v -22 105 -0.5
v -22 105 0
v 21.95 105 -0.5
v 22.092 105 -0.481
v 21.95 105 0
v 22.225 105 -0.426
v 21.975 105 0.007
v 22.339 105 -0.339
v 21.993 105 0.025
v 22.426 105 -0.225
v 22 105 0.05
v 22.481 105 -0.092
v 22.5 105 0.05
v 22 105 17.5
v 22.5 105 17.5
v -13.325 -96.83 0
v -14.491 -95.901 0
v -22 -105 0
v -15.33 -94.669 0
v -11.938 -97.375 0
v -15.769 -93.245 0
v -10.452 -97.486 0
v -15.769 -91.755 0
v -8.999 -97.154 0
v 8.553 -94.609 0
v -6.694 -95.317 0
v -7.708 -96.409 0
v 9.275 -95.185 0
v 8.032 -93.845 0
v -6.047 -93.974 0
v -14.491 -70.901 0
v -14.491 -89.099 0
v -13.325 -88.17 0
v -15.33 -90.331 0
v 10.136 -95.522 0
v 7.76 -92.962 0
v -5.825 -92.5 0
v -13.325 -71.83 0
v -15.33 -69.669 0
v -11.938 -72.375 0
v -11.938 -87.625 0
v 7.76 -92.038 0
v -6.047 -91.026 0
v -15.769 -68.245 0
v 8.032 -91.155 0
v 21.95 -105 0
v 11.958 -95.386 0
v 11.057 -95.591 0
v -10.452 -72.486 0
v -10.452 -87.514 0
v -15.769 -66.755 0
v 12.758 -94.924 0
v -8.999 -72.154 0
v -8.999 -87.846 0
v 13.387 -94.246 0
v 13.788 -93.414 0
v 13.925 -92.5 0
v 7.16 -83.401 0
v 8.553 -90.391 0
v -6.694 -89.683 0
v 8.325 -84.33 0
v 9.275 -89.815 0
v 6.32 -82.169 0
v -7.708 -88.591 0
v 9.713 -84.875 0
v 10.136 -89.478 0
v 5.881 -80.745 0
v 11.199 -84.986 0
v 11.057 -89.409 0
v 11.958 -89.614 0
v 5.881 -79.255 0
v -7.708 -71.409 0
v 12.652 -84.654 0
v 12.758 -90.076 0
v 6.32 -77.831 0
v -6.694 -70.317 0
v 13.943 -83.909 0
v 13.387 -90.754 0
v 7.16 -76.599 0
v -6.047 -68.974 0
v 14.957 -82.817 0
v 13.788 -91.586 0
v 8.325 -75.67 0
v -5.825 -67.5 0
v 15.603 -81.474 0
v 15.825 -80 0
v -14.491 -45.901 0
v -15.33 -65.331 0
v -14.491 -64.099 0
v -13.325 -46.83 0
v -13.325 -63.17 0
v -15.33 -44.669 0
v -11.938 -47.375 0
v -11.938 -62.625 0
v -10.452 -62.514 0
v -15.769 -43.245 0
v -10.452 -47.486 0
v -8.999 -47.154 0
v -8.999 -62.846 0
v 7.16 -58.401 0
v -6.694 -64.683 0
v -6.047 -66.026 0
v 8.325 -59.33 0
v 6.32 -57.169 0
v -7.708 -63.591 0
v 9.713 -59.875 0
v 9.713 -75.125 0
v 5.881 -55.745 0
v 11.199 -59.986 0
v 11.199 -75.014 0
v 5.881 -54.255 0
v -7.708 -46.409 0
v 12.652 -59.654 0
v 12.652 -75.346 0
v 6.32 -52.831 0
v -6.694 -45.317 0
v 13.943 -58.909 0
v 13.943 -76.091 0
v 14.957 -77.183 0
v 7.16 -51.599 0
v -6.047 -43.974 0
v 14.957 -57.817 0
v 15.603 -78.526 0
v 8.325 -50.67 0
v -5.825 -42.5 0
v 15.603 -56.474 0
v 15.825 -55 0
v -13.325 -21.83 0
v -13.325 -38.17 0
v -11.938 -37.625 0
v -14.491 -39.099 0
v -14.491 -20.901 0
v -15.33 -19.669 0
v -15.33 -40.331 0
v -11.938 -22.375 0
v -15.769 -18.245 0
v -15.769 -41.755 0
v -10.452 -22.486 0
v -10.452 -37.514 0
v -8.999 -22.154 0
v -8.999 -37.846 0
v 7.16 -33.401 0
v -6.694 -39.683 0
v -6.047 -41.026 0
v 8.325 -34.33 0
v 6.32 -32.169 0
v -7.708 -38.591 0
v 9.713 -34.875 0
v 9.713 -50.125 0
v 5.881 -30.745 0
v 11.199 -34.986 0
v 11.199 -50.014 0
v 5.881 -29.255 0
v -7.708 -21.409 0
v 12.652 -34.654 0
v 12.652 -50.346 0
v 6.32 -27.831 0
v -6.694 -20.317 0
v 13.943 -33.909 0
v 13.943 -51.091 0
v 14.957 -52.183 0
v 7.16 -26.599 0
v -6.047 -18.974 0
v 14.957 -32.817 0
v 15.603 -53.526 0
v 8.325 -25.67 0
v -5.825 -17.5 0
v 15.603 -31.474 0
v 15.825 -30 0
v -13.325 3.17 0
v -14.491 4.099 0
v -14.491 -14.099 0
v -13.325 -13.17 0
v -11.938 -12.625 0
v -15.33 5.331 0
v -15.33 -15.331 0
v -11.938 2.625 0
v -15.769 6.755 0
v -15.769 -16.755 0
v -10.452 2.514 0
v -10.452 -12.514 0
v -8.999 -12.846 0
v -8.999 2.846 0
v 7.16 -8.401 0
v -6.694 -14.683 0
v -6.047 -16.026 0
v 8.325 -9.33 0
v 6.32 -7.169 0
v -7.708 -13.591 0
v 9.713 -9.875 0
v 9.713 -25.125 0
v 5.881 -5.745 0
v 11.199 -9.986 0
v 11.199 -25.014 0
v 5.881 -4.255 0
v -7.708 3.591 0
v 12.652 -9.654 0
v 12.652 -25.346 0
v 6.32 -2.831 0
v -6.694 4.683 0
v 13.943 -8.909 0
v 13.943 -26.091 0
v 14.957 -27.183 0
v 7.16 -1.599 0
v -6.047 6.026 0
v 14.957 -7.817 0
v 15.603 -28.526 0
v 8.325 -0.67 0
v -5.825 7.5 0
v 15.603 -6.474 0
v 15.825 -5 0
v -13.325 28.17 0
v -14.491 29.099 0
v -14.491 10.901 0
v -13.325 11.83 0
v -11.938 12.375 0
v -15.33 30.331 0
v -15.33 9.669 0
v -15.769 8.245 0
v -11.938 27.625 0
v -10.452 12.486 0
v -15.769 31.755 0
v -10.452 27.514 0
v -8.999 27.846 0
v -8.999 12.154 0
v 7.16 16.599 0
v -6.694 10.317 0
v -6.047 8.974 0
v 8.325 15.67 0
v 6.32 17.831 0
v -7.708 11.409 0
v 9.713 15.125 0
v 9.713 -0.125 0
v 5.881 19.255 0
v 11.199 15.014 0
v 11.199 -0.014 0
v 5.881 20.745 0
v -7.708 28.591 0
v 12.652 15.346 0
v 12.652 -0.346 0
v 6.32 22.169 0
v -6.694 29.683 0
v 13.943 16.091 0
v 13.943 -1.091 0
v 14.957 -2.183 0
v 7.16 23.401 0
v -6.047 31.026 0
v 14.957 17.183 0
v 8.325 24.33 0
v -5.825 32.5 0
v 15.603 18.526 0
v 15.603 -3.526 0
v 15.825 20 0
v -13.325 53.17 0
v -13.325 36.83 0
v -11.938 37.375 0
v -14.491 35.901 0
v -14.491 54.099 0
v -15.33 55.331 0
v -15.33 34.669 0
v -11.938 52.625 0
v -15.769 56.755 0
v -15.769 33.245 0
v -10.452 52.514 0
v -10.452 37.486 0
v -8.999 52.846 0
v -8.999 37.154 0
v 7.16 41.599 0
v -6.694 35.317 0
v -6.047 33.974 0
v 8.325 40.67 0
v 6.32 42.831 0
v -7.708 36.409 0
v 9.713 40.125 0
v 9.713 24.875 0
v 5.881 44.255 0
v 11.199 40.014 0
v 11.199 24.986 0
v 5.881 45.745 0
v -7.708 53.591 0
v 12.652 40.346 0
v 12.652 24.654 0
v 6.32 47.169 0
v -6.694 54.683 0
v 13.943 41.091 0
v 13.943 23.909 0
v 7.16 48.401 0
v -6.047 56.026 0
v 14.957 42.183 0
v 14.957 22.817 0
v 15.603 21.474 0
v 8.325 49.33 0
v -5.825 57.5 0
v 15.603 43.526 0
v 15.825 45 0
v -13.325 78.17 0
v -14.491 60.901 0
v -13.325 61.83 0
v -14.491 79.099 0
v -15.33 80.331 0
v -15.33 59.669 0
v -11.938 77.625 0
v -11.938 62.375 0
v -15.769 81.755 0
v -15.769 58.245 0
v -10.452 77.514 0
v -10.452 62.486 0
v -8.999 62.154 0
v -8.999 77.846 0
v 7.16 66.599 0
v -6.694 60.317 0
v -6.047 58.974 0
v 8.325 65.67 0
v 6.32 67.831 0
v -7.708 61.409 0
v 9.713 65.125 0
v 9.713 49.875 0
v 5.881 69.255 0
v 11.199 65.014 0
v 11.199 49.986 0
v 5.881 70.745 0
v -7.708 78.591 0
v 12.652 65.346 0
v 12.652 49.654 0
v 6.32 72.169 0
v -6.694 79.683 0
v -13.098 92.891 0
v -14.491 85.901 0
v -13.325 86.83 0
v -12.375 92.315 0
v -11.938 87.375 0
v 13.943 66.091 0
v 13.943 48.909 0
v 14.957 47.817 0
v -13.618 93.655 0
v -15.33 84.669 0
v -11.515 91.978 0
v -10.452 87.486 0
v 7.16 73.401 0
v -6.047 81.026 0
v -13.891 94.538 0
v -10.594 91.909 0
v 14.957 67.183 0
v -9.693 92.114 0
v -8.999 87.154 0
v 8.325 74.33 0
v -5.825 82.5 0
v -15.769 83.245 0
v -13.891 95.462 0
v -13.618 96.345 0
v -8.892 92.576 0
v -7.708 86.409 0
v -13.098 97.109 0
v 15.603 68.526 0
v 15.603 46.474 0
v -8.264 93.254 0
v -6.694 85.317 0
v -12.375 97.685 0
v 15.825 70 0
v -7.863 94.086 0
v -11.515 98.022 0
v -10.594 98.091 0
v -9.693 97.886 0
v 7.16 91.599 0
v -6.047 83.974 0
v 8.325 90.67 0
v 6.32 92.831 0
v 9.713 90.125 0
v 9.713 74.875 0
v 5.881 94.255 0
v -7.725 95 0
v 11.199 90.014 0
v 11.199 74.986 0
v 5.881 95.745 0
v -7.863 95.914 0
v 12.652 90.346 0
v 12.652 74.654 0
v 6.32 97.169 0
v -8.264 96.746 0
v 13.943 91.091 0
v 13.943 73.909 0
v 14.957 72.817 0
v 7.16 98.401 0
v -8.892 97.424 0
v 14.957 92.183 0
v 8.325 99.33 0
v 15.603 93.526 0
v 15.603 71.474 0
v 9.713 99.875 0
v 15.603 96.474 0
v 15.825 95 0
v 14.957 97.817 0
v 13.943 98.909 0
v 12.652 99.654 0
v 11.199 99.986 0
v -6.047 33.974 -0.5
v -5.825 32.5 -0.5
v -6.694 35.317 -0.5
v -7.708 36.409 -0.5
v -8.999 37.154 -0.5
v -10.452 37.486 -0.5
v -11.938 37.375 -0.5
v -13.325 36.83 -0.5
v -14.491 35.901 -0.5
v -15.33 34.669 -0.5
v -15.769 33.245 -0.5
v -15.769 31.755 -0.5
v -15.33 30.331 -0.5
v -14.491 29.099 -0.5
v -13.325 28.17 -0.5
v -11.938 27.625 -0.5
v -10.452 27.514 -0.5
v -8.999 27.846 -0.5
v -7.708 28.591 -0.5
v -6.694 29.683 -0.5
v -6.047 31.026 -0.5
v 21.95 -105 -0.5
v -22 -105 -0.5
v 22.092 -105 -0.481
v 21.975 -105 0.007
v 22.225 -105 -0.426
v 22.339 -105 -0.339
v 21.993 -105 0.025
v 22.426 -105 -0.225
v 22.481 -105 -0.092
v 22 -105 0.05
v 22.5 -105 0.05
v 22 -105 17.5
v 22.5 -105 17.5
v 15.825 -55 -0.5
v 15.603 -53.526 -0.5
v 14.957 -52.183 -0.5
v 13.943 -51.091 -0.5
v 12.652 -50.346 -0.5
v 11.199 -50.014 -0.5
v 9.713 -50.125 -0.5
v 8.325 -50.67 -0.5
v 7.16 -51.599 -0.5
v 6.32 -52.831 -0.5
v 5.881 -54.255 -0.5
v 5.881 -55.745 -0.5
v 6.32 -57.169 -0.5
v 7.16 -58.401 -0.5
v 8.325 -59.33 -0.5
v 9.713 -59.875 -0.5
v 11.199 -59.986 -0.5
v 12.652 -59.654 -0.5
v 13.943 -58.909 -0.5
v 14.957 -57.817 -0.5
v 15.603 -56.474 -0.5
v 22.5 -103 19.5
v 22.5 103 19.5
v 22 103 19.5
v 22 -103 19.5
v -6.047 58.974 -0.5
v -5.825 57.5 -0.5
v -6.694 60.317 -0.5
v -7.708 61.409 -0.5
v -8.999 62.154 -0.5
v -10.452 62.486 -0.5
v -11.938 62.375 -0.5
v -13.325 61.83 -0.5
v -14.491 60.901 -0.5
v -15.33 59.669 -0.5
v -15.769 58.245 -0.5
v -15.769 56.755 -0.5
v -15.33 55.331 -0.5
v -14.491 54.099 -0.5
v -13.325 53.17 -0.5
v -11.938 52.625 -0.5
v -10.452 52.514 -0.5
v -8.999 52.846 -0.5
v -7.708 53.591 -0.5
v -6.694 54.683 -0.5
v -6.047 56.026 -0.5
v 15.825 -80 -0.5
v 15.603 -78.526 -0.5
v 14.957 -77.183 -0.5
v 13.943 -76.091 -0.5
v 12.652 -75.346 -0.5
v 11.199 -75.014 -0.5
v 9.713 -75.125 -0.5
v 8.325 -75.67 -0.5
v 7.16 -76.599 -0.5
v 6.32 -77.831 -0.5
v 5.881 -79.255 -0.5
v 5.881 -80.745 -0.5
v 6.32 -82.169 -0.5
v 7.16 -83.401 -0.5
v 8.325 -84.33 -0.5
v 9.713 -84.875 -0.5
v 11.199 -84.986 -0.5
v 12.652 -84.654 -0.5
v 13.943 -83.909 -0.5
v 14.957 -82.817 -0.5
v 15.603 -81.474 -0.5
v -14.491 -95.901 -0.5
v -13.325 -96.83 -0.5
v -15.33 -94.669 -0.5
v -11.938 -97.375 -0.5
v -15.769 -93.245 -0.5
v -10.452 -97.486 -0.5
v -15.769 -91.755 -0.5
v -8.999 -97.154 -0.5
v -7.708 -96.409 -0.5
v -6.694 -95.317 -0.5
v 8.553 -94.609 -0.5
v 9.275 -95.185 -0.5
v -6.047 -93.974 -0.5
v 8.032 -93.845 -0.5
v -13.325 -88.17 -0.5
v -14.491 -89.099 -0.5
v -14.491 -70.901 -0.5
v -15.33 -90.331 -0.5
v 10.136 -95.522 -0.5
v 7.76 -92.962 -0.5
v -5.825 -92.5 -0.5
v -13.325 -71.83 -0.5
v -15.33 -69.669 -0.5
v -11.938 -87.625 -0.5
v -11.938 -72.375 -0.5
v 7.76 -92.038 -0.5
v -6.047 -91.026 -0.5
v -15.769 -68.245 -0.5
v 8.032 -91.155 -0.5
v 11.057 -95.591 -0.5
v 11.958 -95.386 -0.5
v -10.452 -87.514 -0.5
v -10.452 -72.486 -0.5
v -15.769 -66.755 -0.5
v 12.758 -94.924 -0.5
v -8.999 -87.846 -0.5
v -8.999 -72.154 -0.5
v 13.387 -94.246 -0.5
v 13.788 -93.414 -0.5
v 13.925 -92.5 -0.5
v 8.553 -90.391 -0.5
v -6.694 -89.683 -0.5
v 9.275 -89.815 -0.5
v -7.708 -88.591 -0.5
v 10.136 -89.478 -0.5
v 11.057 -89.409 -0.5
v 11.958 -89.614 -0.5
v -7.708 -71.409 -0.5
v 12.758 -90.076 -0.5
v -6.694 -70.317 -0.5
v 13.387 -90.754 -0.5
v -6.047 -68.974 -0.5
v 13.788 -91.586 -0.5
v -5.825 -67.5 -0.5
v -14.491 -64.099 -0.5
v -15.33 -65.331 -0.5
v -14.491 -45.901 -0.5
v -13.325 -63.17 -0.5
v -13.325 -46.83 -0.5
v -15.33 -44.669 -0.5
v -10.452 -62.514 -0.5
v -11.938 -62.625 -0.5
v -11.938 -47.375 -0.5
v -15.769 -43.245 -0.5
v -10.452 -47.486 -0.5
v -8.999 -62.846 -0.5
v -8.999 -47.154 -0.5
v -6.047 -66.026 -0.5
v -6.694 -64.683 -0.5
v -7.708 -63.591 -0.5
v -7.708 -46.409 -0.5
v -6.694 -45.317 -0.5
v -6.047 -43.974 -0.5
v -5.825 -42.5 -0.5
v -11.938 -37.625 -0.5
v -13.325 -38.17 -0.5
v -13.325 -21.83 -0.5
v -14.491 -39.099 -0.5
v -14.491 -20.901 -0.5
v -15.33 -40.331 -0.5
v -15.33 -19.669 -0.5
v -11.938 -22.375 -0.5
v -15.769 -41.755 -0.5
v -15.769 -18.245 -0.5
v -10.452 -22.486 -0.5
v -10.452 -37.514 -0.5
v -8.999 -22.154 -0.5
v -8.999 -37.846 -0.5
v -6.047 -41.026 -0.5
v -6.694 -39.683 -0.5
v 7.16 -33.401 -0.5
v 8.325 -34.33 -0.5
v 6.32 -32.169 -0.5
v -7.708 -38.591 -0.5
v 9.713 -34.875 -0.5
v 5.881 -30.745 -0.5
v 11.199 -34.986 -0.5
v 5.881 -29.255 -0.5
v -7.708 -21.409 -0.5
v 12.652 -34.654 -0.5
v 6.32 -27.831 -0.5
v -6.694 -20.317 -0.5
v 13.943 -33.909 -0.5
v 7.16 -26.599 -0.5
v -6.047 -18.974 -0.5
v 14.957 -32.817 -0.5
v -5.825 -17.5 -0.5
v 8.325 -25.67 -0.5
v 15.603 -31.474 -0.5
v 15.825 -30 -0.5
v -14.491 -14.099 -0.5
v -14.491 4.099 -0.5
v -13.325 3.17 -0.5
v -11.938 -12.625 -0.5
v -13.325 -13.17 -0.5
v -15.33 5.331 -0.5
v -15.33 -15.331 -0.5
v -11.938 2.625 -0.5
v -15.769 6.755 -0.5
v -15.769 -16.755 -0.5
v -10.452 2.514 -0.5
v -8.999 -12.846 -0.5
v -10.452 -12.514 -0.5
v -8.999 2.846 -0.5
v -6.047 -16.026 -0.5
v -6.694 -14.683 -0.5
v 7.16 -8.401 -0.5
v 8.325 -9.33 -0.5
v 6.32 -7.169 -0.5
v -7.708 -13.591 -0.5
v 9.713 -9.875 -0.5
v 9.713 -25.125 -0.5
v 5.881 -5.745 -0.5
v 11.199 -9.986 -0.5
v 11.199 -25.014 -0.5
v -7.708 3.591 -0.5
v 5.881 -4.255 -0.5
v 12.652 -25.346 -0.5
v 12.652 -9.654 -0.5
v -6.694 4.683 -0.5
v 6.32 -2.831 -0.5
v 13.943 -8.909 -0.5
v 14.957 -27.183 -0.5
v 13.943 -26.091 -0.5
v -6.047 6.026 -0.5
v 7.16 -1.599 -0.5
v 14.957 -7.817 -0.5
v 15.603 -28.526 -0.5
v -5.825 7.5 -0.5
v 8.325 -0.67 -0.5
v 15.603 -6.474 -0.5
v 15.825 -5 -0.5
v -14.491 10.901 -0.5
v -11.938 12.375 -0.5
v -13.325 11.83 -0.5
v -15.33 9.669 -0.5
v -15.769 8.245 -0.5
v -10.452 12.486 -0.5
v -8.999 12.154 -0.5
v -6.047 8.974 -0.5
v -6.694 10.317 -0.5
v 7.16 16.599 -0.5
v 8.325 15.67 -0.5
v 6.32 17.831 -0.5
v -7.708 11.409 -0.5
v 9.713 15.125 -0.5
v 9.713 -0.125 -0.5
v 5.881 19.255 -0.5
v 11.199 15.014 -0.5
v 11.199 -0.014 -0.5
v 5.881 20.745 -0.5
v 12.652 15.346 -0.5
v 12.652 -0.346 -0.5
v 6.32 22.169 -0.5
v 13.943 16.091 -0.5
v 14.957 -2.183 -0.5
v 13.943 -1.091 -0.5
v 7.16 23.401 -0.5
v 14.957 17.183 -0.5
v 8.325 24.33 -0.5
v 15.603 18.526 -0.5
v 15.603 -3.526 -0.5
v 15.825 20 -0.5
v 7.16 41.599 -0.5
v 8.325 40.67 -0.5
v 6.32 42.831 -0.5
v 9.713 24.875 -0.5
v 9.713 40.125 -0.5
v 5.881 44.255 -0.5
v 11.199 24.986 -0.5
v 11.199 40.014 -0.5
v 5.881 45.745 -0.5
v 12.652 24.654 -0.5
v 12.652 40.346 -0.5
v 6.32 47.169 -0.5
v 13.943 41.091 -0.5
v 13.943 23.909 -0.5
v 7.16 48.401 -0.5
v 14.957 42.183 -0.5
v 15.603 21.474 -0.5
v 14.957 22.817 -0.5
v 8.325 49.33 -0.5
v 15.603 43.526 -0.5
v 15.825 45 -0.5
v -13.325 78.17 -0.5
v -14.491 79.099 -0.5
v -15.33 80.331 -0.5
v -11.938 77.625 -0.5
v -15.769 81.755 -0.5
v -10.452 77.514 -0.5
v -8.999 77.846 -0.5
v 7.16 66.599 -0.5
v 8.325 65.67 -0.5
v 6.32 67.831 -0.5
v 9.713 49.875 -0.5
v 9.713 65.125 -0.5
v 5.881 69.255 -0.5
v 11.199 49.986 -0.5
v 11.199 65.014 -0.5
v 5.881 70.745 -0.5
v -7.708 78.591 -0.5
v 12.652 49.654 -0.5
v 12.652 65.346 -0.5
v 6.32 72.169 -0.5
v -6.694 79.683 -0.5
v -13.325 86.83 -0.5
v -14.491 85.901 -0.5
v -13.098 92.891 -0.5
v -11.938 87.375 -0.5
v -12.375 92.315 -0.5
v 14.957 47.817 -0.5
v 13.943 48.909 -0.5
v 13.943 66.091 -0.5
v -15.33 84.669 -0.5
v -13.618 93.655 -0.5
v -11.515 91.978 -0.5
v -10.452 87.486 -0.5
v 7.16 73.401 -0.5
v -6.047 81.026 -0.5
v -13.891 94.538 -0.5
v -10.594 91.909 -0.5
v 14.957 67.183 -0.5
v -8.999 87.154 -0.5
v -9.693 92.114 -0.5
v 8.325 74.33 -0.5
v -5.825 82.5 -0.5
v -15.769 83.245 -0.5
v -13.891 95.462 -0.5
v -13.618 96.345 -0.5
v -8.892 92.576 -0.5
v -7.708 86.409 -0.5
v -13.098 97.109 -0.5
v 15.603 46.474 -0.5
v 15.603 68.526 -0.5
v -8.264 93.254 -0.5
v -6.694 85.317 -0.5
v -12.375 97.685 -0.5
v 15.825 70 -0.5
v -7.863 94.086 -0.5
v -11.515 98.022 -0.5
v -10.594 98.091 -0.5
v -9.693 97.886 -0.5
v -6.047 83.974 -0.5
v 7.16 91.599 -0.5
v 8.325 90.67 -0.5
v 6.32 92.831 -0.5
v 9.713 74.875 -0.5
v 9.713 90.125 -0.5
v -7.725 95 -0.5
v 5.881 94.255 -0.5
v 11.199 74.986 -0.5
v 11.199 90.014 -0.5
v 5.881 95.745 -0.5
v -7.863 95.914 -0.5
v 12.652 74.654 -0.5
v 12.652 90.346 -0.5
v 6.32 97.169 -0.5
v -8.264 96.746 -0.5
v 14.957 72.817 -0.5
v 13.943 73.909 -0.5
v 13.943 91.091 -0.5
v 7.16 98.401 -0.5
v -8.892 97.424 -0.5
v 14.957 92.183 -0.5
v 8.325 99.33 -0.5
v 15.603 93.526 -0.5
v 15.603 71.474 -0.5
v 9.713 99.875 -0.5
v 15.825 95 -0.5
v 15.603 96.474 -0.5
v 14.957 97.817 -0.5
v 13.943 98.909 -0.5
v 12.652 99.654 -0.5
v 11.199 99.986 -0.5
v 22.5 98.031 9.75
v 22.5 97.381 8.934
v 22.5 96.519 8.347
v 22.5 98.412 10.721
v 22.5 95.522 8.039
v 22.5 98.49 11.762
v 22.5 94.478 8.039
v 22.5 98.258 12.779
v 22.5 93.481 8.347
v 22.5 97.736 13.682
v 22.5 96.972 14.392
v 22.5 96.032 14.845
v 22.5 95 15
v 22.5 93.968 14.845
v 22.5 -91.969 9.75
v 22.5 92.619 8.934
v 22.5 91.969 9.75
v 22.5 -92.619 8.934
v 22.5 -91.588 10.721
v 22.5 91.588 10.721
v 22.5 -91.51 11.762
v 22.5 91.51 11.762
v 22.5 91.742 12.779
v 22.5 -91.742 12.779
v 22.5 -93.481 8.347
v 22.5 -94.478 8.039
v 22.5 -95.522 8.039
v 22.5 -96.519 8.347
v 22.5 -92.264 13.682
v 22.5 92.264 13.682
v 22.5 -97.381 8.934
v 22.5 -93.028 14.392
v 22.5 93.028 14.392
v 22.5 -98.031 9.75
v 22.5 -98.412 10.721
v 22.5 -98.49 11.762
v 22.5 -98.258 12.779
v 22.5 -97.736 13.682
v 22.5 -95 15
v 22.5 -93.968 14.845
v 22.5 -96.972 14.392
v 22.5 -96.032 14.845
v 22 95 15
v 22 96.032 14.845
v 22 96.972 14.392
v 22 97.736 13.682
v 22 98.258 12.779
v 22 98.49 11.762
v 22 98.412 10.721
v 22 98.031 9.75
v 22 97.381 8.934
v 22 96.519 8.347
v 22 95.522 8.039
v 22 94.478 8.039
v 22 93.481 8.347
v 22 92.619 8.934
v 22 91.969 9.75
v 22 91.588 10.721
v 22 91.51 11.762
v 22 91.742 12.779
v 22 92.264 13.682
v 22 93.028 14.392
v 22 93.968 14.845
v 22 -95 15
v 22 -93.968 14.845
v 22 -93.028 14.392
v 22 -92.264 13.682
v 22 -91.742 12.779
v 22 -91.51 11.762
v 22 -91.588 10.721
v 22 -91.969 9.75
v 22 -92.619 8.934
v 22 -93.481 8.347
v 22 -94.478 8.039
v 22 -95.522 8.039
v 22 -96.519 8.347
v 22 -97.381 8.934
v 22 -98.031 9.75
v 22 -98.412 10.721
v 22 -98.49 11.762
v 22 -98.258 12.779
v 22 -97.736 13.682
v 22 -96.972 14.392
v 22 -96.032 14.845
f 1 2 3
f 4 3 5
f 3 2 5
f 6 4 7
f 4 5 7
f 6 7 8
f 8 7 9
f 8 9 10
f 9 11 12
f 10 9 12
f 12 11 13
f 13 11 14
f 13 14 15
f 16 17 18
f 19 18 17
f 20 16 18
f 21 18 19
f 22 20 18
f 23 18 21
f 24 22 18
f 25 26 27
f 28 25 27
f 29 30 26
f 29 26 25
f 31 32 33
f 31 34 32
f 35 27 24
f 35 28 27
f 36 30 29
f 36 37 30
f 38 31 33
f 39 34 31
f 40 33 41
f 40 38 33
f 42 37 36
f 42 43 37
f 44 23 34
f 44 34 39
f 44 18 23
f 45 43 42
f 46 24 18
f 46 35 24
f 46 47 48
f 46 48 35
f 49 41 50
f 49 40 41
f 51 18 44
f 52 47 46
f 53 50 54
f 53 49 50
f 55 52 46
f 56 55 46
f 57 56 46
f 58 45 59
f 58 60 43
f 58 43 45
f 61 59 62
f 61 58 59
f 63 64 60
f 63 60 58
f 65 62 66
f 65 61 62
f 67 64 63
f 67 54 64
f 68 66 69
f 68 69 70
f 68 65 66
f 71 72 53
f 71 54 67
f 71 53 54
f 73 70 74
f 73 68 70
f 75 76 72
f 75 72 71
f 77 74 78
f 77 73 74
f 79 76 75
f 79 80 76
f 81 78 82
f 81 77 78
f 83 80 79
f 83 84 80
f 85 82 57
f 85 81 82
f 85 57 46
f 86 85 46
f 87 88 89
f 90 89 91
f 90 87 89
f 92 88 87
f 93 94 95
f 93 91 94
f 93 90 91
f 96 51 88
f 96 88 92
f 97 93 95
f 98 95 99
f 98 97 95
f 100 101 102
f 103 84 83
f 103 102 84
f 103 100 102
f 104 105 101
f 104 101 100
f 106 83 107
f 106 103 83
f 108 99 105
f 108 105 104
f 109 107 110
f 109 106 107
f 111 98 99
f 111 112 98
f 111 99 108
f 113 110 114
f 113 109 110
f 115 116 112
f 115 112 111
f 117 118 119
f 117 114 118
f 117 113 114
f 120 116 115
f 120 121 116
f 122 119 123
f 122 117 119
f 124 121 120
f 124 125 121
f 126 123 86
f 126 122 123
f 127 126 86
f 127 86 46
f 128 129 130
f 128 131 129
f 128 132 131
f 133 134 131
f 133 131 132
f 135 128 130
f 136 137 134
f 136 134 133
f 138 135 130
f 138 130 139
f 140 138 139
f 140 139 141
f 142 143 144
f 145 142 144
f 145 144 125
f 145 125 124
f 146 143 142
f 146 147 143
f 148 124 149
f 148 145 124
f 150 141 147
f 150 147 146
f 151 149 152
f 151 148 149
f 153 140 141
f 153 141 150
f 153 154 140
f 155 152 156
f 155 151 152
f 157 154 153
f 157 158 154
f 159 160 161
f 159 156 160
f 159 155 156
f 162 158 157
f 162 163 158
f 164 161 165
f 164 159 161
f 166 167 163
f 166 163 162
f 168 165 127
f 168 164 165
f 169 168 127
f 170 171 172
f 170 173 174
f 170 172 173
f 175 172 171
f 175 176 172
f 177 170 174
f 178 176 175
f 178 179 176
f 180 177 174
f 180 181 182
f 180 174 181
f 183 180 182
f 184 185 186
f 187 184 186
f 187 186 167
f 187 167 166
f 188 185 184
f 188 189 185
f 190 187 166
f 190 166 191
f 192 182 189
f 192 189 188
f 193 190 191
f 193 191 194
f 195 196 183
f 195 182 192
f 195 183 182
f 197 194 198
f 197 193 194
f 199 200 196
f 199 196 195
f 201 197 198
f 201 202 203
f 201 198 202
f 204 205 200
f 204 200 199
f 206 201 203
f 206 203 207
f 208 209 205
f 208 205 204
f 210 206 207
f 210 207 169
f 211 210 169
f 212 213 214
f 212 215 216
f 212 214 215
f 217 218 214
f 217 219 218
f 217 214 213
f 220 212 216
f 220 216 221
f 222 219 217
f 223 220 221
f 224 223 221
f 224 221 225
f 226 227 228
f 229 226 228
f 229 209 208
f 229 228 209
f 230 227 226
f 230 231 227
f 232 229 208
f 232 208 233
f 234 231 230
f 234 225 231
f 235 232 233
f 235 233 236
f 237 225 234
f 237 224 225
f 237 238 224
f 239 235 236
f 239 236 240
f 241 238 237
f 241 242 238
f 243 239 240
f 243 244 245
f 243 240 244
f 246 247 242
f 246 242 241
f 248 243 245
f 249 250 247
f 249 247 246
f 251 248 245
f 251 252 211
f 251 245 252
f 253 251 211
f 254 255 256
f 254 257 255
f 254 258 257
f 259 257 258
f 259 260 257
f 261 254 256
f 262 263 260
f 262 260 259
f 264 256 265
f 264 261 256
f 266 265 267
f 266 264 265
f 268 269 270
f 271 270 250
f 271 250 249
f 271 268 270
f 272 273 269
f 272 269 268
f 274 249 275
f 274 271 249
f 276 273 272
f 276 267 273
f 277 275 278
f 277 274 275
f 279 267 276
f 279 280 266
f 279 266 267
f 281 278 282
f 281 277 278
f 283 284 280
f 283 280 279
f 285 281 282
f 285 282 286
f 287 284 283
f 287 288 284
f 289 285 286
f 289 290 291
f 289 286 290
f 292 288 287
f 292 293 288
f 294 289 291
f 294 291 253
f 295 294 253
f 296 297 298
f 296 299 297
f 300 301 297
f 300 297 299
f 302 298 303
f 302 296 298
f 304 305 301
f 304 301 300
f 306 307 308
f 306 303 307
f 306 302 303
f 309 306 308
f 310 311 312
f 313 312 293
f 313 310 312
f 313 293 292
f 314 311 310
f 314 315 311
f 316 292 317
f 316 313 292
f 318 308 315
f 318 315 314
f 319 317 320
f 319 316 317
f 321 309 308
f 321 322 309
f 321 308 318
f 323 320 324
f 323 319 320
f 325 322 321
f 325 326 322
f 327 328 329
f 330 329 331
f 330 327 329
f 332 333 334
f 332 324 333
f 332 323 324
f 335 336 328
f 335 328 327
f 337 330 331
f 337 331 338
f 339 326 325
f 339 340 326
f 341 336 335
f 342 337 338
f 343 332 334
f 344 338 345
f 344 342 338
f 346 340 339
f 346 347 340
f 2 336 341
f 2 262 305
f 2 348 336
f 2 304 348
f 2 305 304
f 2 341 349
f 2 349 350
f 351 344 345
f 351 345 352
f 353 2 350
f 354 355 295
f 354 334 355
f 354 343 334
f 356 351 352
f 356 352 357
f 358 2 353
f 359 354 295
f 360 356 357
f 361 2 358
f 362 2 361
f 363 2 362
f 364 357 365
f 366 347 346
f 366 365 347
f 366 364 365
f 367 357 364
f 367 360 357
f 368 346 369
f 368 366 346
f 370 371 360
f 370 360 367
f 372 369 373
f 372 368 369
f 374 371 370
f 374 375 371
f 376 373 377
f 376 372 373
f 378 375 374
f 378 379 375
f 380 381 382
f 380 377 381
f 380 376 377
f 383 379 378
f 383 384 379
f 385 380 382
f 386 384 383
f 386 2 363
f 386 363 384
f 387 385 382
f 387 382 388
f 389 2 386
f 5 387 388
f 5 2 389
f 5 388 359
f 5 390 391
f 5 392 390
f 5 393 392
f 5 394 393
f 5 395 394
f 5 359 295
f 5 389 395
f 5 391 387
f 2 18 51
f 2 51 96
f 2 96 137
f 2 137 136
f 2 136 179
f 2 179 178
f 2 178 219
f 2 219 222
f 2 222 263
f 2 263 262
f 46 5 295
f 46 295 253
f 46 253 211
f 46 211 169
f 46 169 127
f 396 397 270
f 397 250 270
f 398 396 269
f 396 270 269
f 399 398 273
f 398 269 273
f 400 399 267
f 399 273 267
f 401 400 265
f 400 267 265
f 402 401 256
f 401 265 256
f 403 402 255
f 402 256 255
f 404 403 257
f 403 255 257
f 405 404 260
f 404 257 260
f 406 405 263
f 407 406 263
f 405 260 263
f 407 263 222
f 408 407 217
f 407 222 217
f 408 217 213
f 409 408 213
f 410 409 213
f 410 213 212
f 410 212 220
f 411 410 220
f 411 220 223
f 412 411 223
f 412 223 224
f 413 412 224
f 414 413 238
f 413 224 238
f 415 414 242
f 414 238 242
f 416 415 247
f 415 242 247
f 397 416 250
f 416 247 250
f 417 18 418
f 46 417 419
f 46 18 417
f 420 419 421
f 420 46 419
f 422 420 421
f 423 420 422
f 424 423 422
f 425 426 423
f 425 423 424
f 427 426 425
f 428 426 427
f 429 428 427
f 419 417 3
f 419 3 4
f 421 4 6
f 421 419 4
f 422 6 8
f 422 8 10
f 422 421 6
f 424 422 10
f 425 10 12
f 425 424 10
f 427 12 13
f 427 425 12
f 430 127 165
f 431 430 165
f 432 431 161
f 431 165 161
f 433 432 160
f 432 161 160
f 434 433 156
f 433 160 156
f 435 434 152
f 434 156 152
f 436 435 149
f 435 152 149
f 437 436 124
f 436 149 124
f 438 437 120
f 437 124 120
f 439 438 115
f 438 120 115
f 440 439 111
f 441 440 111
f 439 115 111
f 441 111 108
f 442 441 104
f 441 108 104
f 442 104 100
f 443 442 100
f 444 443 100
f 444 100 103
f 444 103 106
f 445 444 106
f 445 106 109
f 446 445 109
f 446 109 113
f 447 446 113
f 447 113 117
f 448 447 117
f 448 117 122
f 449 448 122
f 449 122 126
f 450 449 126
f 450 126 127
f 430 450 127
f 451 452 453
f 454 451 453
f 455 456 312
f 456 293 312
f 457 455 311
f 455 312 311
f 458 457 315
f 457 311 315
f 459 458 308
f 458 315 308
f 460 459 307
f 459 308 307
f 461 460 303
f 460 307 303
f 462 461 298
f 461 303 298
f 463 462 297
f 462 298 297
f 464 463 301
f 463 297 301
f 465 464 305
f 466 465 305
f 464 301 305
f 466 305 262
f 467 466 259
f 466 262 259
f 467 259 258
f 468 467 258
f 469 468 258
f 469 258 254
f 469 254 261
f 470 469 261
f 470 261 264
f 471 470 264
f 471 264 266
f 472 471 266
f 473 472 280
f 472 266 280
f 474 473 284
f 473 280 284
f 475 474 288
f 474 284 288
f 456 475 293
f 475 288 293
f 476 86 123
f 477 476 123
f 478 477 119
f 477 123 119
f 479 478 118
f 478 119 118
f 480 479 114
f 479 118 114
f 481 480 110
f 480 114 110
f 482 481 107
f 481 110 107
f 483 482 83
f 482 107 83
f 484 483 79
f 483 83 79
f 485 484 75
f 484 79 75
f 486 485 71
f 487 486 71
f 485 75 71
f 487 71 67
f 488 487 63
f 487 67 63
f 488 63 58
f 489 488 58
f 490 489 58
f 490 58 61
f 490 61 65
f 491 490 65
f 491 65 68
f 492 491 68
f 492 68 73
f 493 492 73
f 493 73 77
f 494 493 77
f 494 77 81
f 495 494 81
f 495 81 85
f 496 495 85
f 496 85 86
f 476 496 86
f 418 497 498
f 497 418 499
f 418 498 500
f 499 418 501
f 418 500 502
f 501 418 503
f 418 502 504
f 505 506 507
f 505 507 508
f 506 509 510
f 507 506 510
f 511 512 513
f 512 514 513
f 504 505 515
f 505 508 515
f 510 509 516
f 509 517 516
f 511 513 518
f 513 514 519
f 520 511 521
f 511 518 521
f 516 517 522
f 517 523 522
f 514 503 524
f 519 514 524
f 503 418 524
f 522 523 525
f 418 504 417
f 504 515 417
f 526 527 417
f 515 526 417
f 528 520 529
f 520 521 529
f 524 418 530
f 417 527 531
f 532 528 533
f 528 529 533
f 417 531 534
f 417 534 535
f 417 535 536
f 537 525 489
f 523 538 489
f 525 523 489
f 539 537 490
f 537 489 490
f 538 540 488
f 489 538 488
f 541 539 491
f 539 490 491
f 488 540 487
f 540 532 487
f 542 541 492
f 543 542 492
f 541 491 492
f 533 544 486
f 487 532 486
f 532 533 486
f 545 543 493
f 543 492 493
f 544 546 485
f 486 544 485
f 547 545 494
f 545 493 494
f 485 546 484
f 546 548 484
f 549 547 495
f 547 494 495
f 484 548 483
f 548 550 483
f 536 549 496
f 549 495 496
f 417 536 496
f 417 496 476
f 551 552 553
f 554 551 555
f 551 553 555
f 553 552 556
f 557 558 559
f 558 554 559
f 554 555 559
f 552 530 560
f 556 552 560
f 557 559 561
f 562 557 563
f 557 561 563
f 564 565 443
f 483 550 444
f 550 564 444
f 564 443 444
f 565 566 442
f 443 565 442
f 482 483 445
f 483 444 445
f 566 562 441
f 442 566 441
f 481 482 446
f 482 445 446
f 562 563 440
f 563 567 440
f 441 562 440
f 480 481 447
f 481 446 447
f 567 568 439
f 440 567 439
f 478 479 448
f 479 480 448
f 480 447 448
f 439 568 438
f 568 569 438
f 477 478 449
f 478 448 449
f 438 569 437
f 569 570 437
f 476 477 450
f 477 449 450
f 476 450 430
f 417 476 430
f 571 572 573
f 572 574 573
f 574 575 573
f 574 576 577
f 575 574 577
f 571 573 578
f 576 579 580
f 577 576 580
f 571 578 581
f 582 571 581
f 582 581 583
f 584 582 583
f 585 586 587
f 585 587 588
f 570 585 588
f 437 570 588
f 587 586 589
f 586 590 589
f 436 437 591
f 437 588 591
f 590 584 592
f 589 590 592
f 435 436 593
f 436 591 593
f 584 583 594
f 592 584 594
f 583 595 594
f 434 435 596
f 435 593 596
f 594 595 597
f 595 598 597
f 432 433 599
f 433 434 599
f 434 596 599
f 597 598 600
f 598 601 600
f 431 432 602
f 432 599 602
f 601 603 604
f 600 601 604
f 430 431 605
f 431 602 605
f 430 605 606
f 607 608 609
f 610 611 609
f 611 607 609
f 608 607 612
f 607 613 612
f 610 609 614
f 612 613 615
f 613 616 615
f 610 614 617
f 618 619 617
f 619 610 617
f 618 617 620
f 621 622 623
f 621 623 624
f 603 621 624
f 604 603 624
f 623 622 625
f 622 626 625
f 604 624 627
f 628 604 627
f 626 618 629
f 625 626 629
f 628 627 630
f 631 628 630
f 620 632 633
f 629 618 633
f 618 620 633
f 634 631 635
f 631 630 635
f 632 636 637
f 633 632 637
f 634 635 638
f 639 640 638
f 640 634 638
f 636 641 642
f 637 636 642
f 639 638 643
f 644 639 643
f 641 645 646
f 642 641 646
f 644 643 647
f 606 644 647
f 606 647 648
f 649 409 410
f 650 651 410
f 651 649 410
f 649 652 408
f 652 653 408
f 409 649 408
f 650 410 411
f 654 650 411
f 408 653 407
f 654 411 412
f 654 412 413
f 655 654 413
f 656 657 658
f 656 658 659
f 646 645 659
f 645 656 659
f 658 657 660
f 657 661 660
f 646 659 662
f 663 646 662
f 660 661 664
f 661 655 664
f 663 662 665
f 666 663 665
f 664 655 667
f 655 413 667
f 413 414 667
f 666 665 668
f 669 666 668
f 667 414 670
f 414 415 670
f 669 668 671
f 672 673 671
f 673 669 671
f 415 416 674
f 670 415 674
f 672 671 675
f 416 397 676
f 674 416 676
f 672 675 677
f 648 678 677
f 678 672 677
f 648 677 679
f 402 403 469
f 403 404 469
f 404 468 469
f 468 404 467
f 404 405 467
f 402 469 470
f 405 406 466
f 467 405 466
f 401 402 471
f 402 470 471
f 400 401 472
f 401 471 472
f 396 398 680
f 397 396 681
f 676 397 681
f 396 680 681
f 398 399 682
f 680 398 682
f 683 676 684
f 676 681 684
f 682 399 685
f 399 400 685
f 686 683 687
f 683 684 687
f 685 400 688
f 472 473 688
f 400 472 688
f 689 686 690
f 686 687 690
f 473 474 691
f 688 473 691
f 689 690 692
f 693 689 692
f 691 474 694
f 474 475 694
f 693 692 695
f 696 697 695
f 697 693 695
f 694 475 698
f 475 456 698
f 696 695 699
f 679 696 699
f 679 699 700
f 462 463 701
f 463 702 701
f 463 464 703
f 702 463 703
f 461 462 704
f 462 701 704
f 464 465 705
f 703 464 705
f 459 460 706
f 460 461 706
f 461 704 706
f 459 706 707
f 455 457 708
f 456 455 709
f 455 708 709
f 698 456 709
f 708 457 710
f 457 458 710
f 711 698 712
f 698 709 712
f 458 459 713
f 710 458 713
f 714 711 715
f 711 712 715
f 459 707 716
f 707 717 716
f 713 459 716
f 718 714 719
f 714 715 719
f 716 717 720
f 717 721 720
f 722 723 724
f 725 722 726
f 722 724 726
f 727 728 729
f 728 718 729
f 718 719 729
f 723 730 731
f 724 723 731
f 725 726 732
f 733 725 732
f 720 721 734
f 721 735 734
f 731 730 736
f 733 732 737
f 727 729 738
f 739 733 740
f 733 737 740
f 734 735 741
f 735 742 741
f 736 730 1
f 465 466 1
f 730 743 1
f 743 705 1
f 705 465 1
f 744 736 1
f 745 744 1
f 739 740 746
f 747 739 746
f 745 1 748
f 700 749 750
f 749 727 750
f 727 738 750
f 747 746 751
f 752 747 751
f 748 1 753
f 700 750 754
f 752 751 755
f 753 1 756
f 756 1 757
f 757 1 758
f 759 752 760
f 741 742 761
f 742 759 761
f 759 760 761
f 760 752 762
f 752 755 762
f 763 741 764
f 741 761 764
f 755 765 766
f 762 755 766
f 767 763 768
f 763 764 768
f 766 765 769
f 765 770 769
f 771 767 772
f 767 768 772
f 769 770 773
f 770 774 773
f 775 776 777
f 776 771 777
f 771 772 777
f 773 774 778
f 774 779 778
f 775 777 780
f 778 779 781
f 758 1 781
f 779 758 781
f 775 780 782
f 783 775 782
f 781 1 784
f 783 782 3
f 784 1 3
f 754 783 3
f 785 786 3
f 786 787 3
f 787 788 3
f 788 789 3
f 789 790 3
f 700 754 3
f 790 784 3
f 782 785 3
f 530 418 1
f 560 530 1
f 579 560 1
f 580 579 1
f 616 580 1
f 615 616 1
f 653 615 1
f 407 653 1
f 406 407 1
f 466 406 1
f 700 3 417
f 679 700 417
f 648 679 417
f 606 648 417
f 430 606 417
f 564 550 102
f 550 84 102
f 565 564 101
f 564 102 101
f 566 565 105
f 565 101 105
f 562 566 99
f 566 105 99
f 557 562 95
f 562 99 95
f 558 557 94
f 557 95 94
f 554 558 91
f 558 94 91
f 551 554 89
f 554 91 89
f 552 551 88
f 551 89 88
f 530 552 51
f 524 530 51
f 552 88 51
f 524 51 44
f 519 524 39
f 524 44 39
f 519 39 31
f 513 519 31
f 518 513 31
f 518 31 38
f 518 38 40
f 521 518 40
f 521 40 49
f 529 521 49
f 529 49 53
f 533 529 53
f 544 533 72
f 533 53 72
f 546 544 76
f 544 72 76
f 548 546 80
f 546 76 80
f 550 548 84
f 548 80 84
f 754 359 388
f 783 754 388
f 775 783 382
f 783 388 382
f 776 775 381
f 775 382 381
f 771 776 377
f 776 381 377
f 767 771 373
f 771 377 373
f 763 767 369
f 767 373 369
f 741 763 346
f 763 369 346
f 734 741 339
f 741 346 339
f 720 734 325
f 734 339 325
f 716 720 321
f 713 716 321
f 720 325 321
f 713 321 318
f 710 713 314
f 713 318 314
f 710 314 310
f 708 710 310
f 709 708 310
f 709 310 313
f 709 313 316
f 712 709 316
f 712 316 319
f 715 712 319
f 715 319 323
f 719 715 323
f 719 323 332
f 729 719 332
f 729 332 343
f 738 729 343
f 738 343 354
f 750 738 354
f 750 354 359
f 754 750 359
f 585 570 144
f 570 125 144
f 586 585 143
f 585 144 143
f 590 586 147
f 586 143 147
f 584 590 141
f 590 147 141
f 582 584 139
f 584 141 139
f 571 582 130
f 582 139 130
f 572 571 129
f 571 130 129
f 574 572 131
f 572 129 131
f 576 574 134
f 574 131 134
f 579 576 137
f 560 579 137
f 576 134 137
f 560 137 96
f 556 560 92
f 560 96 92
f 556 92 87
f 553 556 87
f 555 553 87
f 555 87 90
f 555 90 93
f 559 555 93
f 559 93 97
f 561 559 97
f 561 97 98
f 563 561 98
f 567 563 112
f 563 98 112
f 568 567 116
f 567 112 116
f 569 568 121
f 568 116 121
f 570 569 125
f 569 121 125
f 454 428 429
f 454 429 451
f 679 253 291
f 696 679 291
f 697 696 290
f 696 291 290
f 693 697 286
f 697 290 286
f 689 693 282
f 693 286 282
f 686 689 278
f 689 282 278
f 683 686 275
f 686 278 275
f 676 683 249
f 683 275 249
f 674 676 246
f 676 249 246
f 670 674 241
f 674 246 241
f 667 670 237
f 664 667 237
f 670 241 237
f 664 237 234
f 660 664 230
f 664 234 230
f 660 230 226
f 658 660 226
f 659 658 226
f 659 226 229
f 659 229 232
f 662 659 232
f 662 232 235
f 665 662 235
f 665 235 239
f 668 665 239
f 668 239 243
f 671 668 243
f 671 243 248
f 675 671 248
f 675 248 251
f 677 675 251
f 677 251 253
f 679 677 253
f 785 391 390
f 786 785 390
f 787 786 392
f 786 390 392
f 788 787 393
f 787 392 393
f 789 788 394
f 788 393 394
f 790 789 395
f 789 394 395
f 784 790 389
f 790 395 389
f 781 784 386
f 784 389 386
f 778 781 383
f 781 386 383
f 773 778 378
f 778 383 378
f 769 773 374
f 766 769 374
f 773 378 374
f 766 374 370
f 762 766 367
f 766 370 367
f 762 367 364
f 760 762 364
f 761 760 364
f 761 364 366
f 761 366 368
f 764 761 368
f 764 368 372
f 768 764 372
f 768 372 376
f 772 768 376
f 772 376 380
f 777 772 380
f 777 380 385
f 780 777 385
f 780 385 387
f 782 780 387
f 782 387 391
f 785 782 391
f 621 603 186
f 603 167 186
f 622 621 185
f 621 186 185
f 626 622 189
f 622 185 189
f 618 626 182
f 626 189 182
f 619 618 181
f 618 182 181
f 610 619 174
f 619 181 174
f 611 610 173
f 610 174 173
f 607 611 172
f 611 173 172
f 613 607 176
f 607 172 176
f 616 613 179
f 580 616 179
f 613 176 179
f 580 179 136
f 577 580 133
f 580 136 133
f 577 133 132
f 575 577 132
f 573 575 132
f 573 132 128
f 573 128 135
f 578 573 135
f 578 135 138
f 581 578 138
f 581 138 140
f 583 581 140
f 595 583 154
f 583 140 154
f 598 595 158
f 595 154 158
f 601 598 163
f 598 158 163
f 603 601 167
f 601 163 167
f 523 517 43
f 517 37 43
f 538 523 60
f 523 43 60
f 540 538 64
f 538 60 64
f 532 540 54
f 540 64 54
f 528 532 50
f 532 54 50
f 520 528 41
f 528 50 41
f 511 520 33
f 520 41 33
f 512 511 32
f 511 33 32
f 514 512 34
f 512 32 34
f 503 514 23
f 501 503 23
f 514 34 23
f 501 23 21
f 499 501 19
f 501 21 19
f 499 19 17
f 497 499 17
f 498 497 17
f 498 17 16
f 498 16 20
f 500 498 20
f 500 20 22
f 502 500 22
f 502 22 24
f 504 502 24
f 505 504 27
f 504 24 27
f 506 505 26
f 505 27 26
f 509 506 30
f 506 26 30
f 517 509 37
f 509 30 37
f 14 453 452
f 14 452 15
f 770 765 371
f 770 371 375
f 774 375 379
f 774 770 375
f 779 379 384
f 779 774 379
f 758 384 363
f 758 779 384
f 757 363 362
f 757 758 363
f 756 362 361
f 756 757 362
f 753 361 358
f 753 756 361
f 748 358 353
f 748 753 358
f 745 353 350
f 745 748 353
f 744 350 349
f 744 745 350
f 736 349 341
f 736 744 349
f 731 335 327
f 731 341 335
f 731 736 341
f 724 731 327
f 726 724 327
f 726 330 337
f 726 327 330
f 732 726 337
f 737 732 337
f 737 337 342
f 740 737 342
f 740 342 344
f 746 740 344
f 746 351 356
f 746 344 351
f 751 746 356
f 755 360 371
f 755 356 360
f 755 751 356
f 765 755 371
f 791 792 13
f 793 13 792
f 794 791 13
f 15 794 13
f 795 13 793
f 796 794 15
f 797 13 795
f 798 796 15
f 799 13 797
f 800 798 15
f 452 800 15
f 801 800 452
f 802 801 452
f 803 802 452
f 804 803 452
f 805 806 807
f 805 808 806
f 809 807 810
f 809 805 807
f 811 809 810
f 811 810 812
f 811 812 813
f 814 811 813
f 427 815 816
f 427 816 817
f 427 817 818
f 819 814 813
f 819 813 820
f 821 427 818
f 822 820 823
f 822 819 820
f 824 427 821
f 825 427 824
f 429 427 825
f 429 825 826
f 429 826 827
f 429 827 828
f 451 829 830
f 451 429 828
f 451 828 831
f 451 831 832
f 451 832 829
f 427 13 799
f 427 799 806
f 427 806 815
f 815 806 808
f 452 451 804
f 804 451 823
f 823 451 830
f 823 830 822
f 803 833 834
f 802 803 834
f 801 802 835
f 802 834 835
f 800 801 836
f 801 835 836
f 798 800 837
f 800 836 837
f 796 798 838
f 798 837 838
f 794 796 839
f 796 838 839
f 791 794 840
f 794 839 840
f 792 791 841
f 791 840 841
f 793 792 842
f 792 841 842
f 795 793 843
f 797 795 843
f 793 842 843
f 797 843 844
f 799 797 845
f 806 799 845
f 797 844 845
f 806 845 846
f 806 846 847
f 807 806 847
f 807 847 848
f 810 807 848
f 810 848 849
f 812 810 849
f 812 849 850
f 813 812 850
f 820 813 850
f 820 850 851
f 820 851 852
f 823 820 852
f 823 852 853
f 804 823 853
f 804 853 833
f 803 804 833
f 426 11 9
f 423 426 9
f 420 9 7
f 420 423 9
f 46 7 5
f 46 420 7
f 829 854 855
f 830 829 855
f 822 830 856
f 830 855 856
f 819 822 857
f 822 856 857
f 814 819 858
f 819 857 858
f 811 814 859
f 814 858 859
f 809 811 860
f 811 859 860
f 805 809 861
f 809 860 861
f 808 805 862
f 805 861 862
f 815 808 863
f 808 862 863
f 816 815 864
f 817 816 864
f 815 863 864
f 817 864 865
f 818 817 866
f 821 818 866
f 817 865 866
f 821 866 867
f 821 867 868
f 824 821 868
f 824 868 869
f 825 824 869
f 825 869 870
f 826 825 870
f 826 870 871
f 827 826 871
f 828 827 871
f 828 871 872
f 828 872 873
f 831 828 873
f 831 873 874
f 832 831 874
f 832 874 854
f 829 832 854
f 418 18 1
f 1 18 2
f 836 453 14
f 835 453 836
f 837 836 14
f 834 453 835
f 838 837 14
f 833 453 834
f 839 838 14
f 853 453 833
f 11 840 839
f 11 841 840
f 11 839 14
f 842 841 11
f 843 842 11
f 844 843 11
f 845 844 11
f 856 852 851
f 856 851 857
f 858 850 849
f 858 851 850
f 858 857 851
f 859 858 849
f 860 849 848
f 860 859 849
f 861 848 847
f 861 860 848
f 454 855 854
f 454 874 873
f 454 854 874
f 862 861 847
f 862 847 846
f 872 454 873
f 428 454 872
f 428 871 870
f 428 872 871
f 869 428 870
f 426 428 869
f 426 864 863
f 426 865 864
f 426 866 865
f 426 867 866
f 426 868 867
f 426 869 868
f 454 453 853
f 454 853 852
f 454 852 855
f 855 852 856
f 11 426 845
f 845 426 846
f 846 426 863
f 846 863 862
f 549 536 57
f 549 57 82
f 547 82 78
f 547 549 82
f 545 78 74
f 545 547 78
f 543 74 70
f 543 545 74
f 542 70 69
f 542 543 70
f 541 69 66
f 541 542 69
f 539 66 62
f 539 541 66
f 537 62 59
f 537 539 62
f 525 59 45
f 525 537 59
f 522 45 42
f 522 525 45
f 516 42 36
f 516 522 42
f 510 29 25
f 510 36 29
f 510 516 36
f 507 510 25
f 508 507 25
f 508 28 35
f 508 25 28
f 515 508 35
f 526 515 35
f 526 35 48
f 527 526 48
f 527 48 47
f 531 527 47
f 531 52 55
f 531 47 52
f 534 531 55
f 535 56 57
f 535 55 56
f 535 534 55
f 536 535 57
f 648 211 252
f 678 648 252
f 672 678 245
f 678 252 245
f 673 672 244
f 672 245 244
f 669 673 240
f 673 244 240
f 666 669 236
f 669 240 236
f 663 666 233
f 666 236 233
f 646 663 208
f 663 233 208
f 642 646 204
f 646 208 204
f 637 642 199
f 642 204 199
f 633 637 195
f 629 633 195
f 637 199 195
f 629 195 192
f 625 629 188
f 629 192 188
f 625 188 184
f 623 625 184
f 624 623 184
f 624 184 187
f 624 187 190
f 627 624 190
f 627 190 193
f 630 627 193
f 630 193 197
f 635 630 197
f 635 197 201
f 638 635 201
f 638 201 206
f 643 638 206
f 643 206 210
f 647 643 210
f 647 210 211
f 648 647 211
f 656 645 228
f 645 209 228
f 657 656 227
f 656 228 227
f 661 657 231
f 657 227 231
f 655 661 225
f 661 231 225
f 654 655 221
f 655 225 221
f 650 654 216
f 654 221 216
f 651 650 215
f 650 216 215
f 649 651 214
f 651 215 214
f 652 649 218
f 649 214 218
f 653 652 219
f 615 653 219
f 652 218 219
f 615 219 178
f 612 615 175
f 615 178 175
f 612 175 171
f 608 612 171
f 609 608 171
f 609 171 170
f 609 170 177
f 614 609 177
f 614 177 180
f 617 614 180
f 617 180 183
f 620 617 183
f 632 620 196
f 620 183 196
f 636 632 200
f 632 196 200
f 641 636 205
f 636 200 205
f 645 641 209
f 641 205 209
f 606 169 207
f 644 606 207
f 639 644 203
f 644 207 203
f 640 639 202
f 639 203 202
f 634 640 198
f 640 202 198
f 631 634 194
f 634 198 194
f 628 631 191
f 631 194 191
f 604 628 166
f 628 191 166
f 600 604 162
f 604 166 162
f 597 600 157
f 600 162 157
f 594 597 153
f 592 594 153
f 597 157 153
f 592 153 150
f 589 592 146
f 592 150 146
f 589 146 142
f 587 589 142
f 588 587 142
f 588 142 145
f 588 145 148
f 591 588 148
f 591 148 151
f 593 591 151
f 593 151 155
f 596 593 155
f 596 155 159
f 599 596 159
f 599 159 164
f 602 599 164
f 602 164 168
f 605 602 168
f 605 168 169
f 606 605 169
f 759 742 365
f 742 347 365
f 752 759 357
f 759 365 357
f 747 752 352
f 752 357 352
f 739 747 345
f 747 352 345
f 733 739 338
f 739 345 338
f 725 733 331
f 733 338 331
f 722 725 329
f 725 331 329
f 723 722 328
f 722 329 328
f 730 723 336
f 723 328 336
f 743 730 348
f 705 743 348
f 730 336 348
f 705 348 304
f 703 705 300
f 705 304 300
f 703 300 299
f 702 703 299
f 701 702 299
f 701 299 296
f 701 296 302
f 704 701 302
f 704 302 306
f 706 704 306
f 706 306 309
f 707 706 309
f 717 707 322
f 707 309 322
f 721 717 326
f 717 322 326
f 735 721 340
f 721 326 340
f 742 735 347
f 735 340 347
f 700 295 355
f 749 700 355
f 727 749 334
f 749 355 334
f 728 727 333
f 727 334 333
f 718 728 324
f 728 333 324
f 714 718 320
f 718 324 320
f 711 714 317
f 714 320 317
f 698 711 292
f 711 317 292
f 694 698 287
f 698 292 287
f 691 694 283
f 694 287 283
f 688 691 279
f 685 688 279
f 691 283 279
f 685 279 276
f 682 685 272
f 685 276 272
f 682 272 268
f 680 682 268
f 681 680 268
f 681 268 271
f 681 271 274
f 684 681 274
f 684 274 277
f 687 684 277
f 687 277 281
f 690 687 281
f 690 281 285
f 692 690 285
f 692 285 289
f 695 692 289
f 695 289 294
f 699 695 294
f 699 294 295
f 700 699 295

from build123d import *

# Parameters (mm, degrees)
SKETCH1_W                    = 44
SKETCH1_H                    = 210
BASE_FLANGE1_DEPTH           = 0.5
SKETCH6_R                    = 5
CUT_EXTRUDE1_DEPTH           = 108.281172626
LPATTERN1_COUNT              = 8
LPATTERN1_PITCH              = 25
EDGE_FLANGE1_STRIP_W         = 2.1
EDGE_FLANGE1_STRIP_H         = 0.5
EDGE_FLANGE1_STRIP_CUT_DEPTH = 210
EDGE_FLANGE1_DEPTH           = 210
F_7_0_7_DIAMETER_HOLE1_D     = 7
F_7_0_7_DIAMETER_HOLE1_DEPTH = 60
F_7_0_7_DIAMETER_HOLE1_TIP   = 2.103012167
BREAK_CORNER1_START          = 22
BREAK_CORNER1_DEPTH          = 0.5
CUT_EXTRUDE2_DEPTH           = 110.139818581
CUT_EXTRUDE2_DEPTH_BACK      = 110.139818581
SKETCH13_R                   = 3.1


# Read off the part's stored shape, not the designer's step: Break-Corner1
# Sheet-metal steps are written as plain solids
with BuildPart() as part:
    # Sketch1 → Base-Flange1 (new body)
    with BuildSketch(Plane.XY):
        Rectangle(SKETCH1_W, SKETCH1_H)
    extrude(amount=-BASE_FLANGE1_DEPTH)

    # Sketch6 → Cut-Extrude1 (cut, symmetric)
    with BuildSketch(Plane.XY):
        with Locations((10.825317547, 95)):
            Circle(SKETCH6_R)
        with Locations((-10.825317547, 82.5)):
            Circle(SKETCH6_R)
    cut_extrude1 = extrude(amount=CUT_EXTRUDE1_DEPTH, both=True, mode=Mode.SUBTRACT)

    # LPattern1: Cut-Extrude1 ×8
    with Locations(*[(0, -i * LPATTERN1_PITCH, 0) for i in range(1, LPATTERN1_COUNT)]):
        add(cut_extrude1, mode=Mode.SUBTRACT)

    # Edge-Flange1 strip (across the edge) → Edge-Flange1 strip cut (cut)
    with BuildSketch(Plane(origin=(22, -105, 0), x_dir=(-1, 0, 0), z_dir=(0, 1, 0))):
        with Locations((-1, -0.25)):
            Rectangle(EDGE_FLANGE1_STRIP_W, EDGE_FLANGE1_STRIP_H)
    extrude(amount=EDGE_FLANGE1_STRIP_CUT_DEPTH, mode=Mode.SUBTRACT)

    # Edge-Flange1 section (across the edge) → Edge-Flange1 (add)
    with BuildSketch(Plane(origin=(22, -105, 0), x_dir=(-1, 0, 0), z_dir=(0, 1, 0))):
        with BuildLine():
            Line((-0.5, 0.05), (-0.5, 19.5))
            Line((-0.5, 19.5), (0, 19.5))
            Line((0, 19.5), (0, 0.05))
            ThreePointArc((0, 0.05), (0.014644661, 0.014644661), (0.05, 0))
            Line((0.05, 0), (0.05, -0.5))
            ThreePointArc((0.05, -0.5), (-0.33890873, -0.33890873), (-0.5, 0.05))
        make_face()
    extrude(amount=EDGE_FLANGE1_DEPTH)

    # Ø7.0 (7) Diameter Hole1
    with Locations(Plane(origin=(22.5, 0, 0), x_dir=(0, 0, -1), z_dir=(1, 0, 0))):
        with Locations((-11.5, 95), (-11.5, -95)):
            Hole(F_7_0_7_DIAMETER_HOLE1_D / 2, depth=F_7_0_7_DIAMETER_HOLE1_DEPTH)
            with Locations((0, 0, -(F_7_0_7_DIAMETER_HOLE1_DEPTH + F_7_0_7_DIAMETER_HOLE1_TIP / 2))):  # 118° drill point
                Cone(0, F_7_0_7_DIAMETER_HOLE1_D / 2, F_7_0_7_DIAMETER_HOLE1_TIP, mode=Mode.SUBTRACT)

    # Break-Corner1 outline → Break-Corner1 (cut)
    with BuildSketch(Plane.YZ.offset(BREAK_CORNER1_START)):
        Polygon((-105, 19.5), (-105, 17.5), (-103, 19.5), align=None)
        Polygon((105, 19.5), (103, 19.5), (105, 17.5), align=None)
    extrude(amount=BREAK_CORNER1_DEPTH, mode=Mode.SUBTRACT)

    # Sketch13 → Cut-Extrude2 (cut, two sides: drawn at the far end of the back side and taken through both)
    with BuildSketch(Plane.XY.offset(-CUT_EXTRUDE2_DEPTH_BACK)):
        with Locations((-10.825317547, 95)):
            Circle(SKETCH13_R)
        with Locations((10.825317547, -92.5)):
            Circle(SKETCH13_R)
    extrude(amount=CUT_EXTRUDE2_DEPTH + CUT_EXTRUDE2_DEPTH_BACK, mode=Mode.SUBTRACT)


solid = part.part
